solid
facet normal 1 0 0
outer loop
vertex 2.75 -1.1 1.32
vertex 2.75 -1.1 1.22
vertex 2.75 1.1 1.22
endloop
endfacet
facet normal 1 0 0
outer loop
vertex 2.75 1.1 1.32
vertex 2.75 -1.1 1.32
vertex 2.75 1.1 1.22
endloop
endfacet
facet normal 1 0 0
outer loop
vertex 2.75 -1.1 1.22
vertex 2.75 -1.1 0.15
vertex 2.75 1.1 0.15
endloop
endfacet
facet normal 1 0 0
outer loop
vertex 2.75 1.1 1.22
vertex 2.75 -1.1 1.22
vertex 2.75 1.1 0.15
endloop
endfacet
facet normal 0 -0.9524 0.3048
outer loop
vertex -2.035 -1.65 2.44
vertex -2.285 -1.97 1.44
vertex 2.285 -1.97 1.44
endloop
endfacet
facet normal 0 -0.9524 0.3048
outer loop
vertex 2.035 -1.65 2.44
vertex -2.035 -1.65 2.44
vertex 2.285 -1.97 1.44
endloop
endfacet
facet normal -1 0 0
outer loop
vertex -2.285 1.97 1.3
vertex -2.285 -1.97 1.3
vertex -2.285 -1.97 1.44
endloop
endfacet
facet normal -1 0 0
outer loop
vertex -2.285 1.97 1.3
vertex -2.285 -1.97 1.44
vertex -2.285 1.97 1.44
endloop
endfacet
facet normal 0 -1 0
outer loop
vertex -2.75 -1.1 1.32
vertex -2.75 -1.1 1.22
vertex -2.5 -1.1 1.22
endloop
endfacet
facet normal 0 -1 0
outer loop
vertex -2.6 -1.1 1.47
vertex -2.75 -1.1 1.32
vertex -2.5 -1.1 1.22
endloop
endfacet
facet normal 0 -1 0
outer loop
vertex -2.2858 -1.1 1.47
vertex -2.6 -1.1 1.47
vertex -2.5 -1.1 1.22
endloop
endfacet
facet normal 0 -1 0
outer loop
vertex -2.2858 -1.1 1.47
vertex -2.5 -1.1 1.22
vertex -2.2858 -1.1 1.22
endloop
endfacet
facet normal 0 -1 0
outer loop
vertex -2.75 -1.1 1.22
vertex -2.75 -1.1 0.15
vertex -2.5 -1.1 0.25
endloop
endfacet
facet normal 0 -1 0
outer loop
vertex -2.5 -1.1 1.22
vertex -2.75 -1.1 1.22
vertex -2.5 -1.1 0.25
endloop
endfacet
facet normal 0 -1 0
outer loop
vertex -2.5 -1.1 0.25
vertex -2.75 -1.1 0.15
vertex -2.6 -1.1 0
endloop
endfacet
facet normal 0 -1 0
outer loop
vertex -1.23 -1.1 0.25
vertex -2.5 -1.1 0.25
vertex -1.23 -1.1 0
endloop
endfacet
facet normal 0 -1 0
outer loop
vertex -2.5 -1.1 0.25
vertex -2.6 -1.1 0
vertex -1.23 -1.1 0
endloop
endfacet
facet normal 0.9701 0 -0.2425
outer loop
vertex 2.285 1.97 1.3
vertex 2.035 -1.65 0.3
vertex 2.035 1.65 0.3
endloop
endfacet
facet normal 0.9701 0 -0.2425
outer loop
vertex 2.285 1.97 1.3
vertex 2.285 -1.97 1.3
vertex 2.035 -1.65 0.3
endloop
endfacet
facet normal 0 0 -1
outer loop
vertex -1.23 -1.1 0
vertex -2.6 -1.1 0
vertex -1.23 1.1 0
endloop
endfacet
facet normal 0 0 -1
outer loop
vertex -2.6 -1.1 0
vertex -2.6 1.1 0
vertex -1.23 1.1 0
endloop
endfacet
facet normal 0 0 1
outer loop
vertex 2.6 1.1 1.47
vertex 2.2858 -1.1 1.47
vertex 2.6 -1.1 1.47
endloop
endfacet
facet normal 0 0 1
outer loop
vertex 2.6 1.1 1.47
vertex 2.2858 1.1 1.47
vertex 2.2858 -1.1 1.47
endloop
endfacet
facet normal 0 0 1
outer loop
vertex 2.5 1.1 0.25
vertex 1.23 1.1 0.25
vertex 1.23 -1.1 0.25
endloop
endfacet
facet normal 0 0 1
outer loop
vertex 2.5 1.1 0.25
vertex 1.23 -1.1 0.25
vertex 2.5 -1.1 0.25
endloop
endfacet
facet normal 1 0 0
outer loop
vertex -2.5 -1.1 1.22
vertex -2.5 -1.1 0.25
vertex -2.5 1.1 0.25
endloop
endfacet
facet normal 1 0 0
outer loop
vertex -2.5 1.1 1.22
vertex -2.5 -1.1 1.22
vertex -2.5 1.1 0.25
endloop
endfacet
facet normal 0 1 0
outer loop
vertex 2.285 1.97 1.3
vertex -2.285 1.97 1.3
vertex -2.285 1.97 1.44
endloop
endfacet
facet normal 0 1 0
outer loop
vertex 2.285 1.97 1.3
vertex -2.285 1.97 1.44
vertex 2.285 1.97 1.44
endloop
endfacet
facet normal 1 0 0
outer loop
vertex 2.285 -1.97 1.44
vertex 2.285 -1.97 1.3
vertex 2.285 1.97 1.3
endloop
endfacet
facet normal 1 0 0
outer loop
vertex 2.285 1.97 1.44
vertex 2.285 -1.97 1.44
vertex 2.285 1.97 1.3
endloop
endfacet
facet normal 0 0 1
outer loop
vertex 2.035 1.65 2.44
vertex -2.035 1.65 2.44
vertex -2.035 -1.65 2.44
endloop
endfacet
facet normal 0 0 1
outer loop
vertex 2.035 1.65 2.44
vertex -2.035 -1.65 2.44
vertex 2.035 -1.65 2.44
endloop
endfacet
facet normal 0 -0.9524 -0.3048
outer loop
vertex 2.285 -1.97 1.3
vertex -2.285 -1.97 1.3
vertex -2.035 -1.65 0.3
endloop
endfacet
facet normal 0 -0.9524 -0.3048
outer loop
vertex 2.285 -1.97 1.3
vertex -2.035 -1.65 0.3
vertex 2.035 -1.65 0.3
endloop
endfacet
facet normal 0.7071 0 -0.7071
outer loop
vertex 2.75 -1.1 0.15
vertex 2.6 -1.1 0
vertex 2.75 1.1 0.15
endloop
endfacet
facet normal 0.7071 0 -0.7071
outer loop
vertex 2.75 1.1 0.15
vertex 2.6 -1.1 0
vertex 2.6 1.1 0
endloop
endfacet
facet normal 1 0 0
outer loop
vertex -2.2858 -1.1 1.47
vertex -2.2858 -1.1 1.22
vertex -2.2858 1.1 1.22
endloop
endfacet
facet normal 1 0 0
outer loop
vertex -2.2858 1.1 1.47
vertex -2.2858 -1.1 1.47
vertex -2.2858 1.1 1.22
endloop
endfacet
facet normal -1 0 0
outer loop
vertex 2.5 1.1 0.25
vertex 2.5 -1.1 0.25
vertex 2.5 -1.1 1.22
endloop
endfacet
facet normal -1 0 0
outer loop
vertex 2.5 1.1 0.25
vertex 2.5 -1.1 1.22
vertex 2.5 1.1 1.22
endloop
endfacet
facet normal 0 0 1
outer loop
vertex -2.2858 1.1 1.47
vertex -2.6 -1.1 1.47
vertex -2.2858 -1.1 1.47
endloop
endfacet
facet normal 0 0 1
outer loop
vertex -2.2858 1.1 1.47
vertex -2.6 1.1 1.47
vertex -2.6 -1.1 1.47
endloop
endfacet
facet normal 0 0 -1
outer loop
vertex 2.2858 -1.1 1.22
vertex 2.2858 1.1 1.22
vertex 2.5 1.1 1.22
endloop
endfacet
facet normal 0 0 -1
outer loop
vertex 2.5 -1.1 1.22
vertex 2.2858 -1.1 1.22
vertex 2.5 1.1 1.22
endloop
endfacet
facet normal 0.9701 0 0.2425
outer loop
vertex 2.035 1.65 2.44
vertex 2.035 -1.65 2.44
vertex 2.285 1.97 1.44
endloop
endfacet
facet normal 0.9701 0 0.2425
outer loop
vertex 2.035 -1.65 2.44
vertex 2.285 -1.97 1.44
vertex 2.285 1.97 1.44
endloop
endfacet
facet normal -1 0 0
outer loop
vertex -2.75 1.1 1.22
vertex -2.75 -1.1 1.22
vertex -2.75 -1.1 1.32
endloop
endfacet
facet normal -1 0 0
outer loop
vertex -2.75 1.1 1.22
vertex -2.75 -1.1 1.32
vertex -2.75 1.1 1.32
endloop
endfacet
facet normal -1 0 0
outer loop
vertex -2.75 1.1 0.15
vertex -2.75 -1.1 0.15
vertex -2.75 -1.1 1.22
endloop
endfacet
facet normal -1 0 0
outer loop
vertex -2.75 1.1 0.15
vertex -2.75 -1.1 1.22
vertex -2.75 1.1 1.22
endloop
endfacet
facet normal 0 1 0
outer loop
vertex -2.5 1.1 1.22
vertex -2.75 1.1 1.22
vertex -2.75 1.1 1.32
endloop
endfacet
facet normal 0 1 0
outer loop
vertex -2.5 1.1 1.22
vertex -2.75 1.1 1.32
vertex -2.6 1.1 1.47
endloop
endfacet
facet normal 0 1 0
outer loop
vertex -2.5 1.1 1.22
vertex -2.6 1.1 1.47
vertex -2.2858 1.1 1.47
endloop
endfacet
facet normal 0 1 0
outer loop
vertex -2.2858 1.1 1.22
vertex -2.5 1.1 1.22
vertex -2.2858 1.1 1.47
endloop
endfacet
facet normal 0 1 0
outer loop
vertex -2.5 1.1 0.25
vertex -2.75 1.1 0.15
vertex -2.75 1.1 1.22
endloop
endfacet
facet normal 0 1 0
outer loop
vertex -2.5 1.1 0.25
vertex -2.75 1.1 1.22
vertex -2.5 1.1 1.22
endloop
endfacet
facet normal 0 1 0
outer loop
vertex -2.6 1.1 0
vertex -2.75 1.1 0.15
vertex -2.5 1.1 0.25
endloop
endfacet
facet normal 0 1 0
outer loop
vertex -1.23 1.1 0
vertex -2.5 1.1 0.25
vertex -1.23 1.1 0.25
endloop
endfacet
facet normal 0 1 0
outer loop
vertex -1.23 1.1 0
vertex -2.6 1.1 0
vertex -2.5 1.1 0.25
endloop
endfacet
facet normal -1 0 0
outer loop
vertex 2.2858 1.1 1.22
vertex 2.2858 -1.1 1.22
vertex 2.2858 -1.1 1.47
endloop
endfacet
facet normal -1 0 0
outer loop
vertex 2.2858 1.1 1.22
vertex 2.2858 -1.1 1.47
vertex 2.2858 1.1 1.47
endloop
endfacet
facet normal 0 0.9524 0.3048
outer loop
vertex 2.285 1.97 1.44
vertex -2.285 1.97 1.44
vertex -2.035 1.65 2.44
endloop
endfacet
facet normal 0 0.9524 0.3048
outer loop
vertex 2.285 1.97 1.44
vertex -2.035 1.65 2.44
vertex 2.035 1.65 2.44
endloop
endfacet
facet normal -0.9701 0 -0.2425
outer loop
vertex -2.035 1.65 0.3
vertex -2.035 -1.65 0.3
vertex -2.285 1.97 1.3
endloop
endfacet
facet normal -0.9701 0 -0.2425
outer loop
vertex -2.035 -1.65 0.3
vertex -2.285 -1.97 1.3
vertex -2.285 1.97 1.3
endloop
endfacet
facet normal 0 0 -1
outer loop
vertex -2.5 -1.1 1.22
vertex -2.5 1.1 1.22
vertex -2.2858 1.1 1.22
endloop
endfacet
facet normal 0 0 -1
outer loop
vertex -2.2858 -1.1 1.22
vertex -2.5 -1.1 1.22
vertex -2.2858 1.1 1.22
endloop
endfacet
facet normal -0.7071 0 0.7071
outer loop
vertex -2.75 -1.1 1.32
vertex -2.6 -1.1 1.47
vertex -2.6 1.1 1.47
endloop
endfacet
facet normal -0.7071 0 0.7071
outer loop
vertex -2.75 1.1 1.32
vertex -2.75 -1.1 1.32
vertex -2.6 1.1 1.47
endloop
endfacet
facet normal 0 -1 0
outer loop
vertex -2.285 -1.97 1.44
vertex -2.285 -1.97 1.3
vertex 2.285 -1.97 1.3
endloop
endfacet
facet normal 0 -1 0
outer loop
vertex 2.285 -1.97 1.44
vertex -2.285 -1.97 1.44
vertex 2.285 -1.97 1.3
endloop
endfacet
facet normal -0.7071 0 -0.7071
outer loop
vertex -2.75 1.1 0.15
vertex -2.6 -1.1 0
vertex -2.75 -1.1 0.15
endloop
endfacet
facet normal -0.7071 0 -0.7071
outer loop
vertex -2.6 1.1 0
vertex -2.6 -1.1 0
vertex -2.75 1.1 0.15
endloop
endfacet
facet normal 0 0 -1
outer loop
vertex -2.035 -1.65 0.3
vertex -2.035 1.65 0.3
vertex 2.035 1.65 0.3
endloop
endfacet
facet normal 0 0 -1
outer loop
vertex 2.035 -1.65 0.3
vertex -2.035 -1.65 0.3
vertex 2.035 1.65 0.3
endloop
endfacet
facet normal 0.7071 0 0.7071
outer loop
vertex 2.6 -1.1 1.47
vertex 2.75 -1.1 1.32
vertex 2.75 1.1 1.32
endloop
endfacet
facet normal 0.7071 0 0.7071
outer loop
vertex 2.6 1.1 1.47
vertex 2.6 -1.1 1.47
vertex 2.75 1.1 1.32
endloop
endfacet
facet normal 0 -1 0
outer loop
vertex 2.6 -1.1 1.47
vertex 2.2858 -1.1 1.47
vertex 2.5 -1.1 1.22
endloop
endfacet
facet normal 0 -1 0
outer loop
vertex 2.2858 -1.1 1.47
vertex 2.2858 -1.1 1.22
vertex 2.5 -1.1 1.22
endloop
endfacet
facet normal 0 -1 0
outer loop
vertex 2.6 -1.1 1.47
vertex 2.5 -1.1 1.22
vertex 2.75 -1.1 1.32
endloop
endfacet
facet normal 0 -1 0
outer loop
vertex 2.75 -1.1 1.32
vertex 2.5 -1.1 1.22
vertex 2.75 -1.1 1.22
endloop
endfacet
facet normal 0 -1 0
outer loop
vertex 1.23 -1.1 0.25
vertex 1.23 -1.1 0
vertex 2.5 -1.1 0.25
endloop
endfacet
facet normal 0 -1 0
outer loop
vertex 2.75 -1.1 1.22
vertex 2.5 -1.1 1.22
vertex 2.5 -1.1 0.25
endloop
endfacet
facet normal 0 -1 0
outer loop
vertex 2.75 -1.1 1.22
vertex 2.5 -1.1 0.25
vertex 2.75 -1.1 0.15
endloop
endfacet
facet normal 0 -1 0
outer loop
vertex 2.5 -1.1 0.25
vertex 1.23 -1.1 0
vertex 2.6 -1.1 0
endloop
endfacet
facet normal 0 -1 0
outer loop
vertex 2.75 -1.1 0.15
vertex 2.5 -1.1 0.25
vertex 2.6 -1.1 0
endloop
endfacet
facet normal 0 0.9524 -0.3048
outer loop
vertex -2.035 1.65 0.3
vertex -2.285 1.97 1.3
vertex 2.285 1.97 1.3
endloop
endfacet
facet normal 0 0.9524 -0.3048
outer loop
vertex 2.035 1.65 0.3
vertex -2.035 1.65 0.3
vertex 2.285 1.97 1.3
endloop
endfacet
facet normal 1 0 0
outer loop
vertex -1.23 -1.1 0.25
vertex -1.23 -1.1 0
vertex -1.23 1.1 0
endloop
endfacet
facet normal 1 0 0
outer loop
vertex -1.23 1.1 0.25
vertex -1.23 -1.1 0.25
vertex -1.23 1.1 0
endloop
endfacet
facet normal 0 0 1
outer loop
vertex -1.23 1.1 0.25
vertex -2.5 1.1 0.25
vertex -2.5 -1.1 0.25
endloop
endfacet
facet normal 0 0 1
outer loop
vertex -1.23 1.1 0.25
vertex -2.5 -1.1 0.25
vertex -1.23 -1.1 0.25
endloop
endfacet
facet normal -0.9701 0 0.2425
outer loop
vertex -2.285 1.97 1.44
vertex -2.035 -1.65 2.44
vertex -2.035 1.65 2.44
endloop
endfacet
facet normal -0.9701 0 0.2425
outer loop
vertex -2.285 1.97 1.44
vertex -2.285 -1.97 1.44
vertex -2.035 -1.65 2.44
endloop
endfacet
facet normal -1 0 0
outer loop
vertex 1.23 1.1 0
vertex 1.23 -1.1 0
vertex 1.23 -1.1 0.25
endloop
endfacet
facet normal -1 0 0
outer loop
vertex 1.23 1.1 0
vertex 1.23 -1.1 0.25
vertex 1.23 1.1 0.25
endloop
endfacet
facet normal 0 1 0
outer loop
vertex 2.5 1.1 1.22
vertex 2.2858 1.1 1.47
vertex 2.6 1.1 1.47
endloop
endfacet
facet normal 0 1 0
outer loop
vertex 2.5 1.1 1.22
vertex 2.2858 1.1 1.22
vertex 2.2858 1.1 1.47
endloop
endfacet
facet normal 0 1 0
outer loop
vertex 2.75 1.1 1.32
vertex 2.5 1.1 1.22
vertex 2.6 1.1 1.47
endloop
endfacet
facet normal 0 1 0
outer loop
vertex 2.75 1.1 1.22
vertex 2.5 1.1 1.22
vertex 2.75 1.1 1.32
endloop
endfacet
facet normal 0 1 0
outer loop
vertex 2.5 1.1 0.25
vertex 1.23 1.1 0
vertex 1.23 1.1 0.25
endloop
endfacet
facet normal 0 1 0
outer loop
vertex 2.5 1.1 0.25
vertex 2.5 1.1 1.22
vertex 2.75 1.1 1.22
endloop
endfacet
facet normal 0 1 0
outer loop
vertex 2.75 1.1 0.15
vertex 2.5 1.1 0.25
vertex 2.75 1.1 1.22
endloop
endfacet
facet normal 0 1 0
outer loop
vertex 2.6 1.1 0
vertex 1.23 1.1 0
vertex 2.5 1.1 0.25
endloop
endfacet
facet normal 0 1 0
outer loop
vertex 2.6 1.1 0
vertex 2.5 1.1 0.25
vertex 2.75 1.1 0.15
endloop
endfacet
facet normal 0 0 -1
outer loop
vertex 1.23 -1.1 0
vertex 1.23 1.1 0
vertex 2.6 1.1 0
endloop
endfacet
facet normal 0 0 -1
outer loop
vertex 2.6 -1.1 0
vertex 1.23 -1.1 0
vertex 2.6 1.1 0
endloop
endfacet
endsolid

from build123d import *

# Parameters (mm, degrees)
F0_W       = 1.27
F0_H       = 2.2
F1_DEPTH   = 0.25
F0_W_2     = 0.25
F2_DEPTH   = 1.22
F4_W       = 4.57
F4_H       = 3.94
F5_DEPTH   = 2.14
F6_SIZE2   = 1
F6_SIZE    = 0.25
F6_2_SIZE2 = 1
F6_2_SIZE  = 0.25
F7_SIZE2   = 1
F7_SIZE    = 0.32
F7_2_SIZE2 = 1
F7_2_SIZE  = 0.32
F9_W       = 0.4641725831
F9_H       = 2.2
F10_DEPTH  = 0.25
F11_SIZE   = 0.15
F11_2_SIZE = 0.15


with BuildPart() as f1:
    # F0 (on Top) → F1 (new body)
    with BuildSketch(Plane.XY):
        with Locations((-1.865, 0)):
            Rectangle(F0_W, F0_H)
    extrude(amount=F1_DEPTH)

    # F0 (on Top) → F2 (join)
    with BuildSketch(Plane.XY):
        with Locations((-2.625, 0)):
            Rectangle(F0_W_2, F0_H)
    extrude(amount=F2_DEPTH)

    # F9 (on offset) → F10 (join)
    with BuildSketch(Plane.XY.offset(1.22)):
        with Locations((-2.5179137085, 0)):
            Rectangle(F9_W, F9_H)
    extrude(amount=F10_DEPTH)

    # F11
    f11_edges = [f1.edges().sort_by_distance(p)[0] for p in [
        (-2.75, 0, 1.47),
        (-2.75, 0, 0),
    ]]
    chamfer(f11_edges, length=F11_SIZE)


with BuildPart() as f1b:
    # F0 (on Top) → F1, piece 2 (new body)
    with BuildSketch(Plane.XY):
        with Locations((1.865, 0)):
            Rectangle(F0_W, F0_H)
    extrude(amount=F1_DEPTH)

    # F0 (on Top) → F2, piece 2 (join)
    with BuildSketch(Plane.XY):
        with Locations((2.625, 0)):
            Rectangle(F0_W_2, F0_H)
    extrude(amount=F2_DEPTH)

    # F9 (on offset) → F10, piece 2 (join)
    with BuildSketch(Plane.XY.offset(1.22)):
        with Locations((2.5179137085, 0)):
            Rectangle(F9_W, F9_H)
    extrude(amount=F10_DEPTH)

    # F11#2
    f11_2_edges = [f1b.edges().sort_by_distance(p)[0] for p in [
        (2.75, 0, 1.47),
        (2.75, 0, 0),
    ]]
    chamfer(f11_2_edges, length=F11_2_SIZE)


with BuildPart() as f5:
    # F4 (on offset) → F5 (new body)
    with BuildSketch(Plane.XY.offset(0.3)):
        Rectangle(F4_W, F4_H)
    extrude(amount=F5_DEPTH)

    # F6
    f6_edges = [f5.edges().sort_by_distance(p)[0] for p in [
        (-2.285, 0, 2.44),
        (2.285, 0, 2.44),
    ]]
    f6_side = f5.faces().sort_by_distance((0, 0, 2.44))[0]
    chamfer(f6_edges, length=F6_SIZE, length2=F6_SIZE2, reference=f6_side)

    # F6#2
    f6_2_edges = [f5.edges().sort_by_distance(p)[0] for p in [
        (-2.285, 0, 0.3),
        (2.285, 0, 0.3),
    ]]
    f6_2_side = f5.faces().sort_by_distance((0, 0, 0.3))[0]
    chamfer(f6_2_edges, length=F6_2_SIZE, length2=F6_2_SIZE2, reference=f6_2_side)

    # F7
    f7_edges = [f5.edges().sort_by_distance(p)[0] for p in [
        (0, 1.97, 2.44),
        (0, -1.97, 2.44),
    ]]
    f7_side = f5.faces().sort_by_distance((0, 0, 2.44))[0]
    chamfer(f7_edges, length=F7_SIZE, length2=F7_SIZE2, reference=f7_side)

    # F7#2
    f7_2_edges = [f5.edges().sort_by_distance(p)[0] for p in [
        (0, 1.97, 0.3),
        (0, -1.97, 0.3),
    ]]
    f7_2_side = f5.faces().sort_by_distance((0, 0, 0.3))[0]
    chamfer(f7_2_edges, length=F7_2_SIZE, length2=F7_2_SIZE2, reference=f7_2_side)


solid = Compound([f1.part, f1b.part, f5.part])
